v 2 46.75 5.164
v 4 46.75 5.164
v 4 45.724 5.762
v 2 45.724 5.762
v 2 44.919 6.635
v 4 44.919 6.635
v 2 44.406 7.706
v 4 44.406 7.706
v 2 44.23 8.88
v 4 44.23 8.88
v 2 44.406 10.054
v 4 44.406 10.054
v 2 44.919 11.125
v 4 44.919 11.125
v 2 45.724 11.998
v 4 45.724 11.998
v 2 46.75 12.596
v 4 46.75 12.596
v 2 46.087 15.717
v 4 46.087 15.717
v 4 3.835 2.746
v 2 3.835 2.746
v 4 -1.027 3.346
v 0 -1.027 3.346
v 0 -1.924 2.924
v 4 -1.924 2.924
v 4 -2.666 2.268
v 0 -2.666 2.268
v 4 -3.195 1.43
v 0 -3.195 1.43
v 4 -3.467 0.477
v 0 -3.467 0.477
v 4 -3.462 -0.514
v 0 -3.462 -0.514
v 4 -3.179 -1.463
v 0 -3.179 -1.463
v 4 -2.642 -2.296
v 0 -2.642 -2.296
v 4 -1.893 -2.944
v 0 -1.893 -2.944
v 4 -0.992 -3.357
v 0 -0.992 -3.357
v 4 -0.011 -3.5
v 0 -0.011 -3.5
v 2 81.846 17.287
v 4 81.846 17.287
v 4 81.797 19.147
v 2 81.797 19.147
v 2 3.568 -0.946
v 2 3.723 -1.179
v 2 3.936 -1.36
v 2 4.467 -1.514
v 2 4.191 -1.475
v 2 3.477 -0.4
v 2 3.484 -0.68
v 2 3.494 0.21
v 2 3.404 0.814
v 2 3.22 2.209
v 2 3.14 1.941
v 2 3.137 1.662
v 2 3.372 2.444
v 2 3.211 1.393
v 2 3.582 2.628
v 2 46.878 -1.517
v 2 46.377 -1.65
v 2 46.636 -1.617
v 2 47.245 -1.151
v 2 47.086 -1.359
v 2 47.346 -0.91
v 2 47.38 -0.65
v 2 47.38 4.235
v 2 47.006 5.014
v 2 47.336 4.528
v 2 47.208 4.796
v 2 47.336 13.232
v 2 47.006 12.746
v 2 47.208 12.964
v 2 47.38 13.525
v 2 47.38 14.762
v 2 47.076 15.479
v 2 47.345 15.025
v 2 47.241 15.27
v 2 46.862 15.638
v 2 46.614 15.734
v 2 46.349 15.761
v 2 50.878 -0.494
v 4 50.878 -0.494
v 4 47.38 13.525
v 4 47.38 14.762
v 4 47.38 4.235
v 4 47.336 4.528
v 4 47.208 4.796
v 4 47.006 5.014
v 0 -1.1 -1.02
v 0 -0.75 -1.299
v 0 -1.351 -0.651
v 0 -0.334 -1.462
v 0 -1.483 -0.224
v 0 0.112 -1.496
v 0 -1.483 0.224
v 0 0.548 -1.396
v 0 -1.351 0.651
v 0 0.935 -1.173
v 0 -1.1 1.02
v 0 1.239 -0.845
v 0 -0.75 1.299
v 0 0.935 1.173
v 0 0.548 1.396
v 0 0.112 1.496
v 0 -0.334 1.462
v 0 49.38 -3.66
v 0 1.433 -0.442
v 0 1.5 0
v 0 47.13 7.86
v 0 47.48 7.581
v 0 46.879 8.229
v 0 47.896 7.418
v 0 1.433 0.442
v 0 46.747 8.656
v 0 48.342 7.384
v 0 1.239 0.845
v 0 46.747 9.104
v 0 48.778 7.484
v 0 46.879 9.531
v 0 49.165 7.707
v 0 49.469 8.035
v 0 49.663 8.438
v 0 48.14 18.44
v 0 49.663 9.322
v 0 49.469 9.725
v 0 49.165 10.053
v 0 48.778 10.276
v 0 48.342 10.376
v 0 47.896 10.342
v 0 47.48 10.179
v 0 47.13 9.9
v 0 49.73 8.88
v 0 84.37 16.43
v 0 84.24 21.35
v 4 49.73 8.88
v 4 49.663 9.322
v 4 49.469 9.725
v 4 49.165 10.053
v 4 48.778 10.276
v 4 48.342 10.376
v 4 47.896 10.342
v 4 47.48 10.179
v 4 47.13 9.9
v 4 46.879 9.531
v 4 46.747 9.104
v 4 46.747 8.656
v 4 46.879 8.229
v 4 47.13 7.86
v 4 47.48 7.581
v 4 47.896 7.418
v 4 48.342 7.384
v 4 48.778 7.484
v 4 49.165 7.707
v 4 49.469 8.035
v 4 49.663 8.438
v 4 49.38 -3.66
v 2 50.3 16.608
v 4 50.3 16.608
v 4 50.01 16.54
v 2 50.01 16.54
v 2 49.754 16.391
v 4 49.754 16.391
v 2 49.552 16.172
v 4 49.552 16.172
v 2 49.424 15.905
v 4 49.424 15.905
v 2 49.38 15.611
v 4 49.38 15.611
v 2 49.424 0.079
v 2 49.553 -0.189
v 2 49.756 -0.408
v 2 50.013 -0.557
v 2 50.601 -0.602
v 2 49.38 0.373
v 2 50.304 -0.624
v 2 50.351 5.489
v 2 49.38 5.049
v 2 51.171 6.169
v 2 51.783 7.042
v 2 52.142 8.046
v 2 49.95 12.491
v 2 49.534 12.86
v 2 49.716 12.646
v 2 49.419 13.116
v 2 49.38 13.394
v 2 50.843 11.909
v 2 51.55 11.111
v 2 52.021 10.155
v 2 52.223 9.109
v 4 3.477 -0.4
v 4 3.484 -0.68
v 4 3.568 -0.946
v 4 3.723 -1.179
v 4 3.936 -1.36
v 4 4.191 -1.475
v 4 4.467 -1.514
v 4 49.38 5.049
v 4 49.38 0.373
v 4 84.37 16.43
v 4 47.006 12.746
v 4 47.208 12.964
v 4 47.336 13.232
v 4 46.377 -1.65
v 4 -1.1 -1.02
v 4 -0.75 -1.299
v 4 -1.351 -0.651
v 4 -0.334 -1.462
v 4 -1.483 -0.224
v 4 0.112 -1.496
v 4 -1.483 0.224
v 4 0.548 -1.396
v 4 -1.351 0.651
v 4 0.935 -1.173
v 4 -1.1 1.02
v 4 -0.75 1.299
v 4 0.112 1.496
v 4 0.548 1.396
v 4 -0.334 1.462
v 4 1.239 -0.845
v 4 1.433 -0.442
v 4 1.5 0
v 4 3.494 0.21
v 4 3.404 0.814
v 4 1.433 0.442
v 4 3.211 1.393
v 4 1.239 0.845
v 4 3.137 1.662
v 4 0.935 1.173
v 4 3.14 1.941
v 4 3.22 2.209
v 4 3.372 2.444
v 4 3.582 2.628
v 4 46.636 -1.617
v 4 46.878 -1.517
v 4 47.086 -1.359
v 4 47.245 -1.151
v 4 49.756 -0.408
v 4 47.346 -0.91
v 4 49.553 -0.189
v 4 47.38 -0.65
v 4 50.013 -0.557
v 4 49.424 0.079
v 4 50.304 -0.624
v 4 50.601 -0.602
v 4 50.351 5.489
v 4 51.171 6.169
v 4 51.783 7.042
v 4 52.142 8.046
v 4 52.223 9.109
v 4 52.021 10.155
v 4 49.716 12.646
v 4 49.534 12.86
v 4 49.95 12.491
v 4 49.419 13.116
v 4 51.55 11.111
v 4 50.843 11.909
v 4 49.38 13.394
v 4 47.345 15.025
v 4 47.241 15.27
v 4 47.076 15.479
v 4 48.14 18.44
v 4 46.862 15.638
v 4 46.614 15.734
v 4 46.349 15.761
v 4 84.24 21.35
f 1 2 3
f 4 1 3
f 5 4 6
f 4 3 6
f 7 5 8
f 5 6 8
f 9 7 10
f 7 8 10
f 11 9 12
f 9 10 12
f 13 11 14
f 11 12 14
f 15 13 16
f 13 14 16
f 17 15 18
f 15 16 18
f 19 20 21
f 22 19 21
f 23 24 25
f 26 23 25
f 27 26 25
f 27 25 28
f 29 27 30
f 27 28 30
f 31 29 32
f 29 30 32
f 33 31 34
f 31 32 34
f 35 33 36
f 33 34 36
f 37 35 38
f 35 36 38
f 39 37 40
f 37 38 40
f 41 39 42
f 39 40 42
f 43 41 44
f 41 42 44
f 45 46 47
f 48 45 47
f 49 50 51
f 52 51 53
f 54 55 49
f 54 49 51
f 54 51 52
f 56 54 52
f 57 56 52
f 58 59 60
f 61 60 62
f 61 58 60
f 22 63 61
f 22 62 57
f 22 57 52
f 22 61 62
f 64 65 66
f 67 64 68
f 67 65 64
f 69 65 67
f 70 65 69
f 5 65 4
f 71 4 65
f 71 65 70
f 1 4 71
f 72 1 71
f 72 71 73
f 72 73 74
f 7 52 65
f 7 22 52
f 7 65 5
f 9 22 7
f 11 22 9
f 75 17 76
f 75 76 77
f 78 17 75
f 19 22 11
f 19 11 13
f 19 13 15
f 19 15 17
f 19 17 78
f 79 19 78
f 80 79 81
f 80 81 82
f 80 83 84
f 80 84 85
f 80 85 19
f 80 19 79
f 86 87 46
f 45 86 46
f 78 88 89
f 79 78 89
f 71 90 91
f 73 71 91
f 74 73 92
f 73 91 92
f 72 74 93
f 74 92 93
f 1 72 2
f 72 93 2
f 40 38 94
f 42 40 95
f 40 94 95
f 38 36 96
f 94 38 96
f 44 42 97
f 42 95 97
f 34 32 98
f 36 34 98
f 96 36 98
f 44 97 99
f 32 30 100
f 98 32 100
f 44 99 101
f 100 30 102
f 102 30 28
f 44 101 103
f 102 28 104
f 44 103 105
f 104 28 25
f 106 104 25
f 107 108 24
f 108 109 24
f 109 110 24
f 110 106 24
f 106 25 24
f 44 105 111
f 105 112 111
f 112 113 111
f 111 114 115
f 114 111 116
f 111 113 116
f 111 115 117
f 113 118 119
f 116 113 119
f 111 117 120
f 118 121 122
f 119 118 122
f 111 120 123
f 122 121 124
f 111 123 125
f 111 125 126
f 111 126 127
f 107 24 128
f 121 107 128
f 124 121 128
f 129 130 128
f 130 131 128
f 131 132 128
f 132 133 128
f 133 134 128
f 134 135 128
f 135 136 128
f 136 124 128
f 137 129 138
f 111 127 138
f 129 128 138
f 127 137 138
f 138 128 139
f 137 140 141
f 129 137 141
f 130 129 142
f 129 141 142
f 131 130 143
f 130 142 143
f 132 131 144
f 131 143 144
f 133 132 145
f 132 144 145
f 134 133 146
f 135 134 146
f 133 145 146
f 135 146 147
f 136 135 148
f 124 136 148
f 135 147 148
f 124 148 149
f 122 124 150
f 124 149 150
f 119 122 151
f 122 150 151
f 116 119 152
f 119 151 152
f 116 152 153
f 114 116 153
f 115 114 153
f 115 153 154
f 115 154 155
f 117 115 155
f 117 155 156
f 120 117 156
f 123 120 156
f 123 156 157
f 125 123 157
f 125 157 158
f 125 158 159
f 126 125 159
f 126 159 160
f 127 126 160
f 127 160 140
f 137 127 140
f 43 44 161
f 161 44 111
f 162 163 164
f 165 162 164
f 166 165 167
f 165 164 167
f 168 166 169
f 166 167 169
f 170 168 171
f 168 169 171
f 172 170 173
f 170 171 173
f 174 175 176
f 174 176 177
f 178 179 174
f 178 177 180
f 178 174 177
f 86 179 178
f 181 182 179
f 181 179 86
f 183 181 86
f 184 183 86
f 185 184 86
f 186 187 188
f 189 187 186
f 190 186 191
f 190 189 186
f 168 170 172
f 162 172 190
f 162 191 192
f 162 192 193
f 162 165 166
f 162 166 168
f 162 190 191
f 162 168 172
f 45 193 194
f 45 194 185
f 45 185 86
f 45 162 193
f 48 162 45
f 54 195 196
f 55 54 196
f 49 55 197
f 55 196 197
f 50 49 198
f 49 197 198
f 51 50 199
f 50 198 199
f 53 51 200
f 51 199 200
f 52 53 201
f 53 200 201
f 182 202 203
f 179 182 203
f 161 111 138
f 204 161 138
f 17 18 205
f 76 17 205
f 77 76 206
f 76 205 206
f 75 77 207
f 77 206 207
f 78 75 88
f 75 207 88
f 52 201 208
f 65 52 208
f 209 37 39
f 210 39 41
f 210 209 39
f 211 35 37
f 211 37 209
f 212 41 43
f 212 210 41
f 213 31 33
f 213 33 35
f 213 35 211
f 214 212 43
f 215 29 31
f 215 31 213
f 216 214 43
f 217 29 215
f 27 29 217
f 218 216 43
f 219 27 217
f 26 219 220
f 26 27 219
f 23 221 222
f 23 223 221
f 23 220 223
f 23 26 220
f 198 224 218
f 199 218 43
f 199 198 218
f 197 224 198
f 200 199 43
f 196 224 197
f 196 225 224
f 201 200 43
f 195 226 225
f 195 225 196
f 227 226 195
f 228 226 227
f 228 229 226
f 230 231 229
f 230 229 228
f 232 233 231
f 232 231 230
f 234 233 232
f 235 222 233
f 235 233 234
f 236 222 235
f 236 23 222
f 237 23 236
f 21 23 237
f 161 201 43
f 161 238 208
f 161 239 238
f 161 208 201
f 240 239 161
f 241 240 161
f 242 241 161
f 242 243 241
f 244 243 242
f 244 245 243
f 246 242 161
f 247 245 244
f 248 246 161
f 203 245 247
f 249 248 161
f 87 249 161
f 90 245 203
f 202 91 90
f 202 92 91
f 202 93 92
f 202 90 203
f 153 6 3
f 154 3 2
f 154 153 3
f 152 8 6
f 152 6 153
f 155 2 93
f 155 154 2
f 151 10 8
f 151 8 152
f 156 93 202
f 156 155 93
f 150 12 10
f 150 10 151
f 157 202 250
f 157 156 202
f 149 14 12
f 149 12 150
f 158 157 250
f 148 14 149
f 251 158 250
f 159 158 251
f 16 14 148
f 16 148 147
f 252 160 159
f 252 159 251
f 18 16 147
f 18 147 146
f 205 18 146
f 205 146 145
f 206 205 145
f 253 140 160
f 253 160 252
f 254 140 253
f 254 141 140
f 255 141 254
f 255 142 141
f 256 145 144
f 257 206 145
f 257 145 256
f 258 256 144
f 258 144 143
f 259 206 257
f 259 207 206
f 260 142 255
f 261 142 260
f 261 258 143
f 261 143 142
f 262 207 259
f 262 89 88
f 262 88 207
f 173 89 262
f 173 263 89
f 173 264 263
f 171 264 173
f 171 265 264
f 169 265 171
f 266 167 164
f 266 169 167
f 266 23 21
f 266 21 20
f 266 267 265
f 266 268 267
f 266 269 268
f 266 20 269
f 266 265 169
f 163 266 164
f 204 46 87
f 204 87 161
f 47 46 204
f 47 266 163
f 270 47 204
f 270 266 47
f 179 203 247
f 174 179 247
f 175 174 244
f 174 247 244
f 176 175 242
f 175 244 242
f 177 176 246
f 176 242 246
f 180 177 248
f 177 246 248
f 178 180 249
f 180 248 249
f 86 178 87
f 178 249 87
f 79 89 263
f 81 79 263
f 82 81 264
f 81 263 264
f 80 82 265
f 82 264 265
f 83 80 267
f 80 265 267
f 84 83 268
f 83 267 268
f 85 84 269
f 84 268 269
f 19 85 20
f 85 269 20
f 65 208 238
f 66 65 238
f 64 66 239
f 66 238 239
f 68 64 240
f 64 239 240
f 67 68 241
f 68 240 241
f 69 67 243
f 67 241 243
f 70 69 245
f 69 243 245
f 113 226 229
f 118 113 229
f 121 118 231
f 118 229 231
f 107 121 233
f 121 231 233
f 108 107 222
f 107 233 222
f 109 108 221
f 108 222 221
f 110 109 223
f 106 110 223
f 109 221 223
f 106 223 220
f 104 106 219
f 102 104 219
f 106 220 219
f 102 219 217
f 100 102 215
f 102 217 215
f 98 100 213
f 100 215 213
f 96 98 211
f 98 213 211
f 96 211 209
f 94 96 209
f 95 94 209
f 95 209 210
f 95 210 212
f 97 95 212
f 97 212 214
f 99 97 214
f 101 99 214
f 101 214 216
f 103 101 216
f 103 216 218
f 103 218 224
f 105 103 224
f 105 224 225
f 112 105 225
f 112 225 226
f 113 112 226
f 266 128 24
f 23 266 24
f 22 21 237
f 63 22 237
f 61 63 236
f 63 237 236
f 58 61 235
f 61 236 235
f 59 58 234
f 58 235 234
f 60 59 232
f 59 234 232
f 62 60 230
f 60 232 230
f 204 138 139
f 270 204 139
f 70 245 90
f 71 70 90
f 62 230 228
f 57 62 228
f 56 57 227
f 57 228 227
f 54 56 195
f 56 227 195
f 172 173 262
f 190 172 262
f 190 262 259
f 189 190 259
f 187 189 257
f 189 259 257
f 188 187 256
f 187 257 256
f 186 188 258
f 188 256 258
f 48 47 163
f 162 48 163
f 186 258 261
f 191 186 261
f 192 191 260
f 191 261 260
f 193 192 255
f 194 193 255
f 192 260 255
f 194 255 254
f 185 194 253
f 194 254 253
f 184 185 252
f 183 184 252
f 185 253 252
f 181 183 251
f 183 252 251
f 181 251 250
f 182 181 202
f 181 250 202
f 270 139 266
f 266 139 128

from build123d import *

# Parameters (mm, degrees)
F1_DEPTH = 4
F3_DEPTH = 2
F4_R     = 1.5
F5_DEPTH = 4.001


with BuildPart() as f1:
    # F0 (on Right) → F1 (new body)
    with BuildSketch(Plane.YZ):
        with BuildLine():
            Line((48.14, 18.44), (-1.027172, 3.345881))
            ThreePointArc((-1.027172, 3.345881), (-3.462092, -0.513727), (-0.011339, -3.499982))
            Line((-0.011339, -3.499982), (49.38, -3.66))
            Line((49.38, -3.66), (84.37, 16.43))
            Line((84.37, 16.43), (84.24, 21.35))
            Line((84.24, 21.35), (48.14, 18.44))
        make_face()
    extrude(amount=F1_DEPTH)

    # F2 (on face) → F3 (cut)
    with BuildSketch(Plane.YZ.offset(4)):
        with BuildLine():
            ThreePointArc((46.75, 5.163873), (44.23, 8.88), (46.75, 12.596127))
            ThreePointArc((46.75, 12.596127), (47.207647, 12.96391), (47.38, 13.525159))
            Line((47.38, 13.525159), (47.38, 14.7615))
            ThreePointArc((47.38, 14.7615), (46.974358, 15.565701), (46.086522, 15.717466))
            Line((46.086522, 15.717466), (3.834993, 2.746421))
            ThreePointArc((3.834993, 2.746421), (3.220284, 2.20902), (3.211033, 1.392576))
            ThreePointArc((3.211033, 1.392576), (3.462092, 0.513727), (3.47705, -0.400156))
            ThreePointArc((3.47705, -0.400156), (3.722981, -1.178735), (4.467253, -1.514481))
            Line((4.467253, -1.514481), (46.37676, -1.65026))
            ThreePointArc((46.37676, -1.65026), (47.08596, -1.358516), (47.38, -0.650265))
            Line((47.38, -0.650265), (47.38, 4.234841))
            ThreePointArc((47.38, 4.234841), (47.207647, 4.79609), (46.75, 5.163873))
        make_face()
        with BuildLine():
            Line((49.38, 15.610834), (49.38, 13.394144))
            ThreePointArc((49.38, 13.394144), (49.534423, 12.860291), (49.95, 12.491316))
            ThreePointArc((49.95, 12.491316), (52.21832, 8.574543), (49.38, 5.048877))
            Line((49.38, 5.048877), (49.38, 0.373496))
            ThreePointArc((49.38, 0.373496), (49.878964, -0.49193), (50.877926, -0.493723))
            Line((50.877926, -0.493723), (81.846475, 17.287304))
            Line((81.846475, 17.287304), (81.797347, 19.146612))
            Line((81.797347, 19.146612), (50.299651, 16.607601))
            ThreePointArc((50.299651, 16.607601), (49.645034, 16.288938), (49.38, 15.610834))
        make_face()
    extrude(amount=-F3_DEPTH, mode=Mode.SUBTRACT)

    # F4 (on face) → F5 (cut, through all)
    with BuildSketch(Plane.YZ.offset(4)):
        Circle(F4_R)
        with Locations((48.23, 8.88)):
            Circle(F4_R)
    extrude(amount=-F5_DEPTH, mode=Mode.SUBTRACT)


solid = f1.part
